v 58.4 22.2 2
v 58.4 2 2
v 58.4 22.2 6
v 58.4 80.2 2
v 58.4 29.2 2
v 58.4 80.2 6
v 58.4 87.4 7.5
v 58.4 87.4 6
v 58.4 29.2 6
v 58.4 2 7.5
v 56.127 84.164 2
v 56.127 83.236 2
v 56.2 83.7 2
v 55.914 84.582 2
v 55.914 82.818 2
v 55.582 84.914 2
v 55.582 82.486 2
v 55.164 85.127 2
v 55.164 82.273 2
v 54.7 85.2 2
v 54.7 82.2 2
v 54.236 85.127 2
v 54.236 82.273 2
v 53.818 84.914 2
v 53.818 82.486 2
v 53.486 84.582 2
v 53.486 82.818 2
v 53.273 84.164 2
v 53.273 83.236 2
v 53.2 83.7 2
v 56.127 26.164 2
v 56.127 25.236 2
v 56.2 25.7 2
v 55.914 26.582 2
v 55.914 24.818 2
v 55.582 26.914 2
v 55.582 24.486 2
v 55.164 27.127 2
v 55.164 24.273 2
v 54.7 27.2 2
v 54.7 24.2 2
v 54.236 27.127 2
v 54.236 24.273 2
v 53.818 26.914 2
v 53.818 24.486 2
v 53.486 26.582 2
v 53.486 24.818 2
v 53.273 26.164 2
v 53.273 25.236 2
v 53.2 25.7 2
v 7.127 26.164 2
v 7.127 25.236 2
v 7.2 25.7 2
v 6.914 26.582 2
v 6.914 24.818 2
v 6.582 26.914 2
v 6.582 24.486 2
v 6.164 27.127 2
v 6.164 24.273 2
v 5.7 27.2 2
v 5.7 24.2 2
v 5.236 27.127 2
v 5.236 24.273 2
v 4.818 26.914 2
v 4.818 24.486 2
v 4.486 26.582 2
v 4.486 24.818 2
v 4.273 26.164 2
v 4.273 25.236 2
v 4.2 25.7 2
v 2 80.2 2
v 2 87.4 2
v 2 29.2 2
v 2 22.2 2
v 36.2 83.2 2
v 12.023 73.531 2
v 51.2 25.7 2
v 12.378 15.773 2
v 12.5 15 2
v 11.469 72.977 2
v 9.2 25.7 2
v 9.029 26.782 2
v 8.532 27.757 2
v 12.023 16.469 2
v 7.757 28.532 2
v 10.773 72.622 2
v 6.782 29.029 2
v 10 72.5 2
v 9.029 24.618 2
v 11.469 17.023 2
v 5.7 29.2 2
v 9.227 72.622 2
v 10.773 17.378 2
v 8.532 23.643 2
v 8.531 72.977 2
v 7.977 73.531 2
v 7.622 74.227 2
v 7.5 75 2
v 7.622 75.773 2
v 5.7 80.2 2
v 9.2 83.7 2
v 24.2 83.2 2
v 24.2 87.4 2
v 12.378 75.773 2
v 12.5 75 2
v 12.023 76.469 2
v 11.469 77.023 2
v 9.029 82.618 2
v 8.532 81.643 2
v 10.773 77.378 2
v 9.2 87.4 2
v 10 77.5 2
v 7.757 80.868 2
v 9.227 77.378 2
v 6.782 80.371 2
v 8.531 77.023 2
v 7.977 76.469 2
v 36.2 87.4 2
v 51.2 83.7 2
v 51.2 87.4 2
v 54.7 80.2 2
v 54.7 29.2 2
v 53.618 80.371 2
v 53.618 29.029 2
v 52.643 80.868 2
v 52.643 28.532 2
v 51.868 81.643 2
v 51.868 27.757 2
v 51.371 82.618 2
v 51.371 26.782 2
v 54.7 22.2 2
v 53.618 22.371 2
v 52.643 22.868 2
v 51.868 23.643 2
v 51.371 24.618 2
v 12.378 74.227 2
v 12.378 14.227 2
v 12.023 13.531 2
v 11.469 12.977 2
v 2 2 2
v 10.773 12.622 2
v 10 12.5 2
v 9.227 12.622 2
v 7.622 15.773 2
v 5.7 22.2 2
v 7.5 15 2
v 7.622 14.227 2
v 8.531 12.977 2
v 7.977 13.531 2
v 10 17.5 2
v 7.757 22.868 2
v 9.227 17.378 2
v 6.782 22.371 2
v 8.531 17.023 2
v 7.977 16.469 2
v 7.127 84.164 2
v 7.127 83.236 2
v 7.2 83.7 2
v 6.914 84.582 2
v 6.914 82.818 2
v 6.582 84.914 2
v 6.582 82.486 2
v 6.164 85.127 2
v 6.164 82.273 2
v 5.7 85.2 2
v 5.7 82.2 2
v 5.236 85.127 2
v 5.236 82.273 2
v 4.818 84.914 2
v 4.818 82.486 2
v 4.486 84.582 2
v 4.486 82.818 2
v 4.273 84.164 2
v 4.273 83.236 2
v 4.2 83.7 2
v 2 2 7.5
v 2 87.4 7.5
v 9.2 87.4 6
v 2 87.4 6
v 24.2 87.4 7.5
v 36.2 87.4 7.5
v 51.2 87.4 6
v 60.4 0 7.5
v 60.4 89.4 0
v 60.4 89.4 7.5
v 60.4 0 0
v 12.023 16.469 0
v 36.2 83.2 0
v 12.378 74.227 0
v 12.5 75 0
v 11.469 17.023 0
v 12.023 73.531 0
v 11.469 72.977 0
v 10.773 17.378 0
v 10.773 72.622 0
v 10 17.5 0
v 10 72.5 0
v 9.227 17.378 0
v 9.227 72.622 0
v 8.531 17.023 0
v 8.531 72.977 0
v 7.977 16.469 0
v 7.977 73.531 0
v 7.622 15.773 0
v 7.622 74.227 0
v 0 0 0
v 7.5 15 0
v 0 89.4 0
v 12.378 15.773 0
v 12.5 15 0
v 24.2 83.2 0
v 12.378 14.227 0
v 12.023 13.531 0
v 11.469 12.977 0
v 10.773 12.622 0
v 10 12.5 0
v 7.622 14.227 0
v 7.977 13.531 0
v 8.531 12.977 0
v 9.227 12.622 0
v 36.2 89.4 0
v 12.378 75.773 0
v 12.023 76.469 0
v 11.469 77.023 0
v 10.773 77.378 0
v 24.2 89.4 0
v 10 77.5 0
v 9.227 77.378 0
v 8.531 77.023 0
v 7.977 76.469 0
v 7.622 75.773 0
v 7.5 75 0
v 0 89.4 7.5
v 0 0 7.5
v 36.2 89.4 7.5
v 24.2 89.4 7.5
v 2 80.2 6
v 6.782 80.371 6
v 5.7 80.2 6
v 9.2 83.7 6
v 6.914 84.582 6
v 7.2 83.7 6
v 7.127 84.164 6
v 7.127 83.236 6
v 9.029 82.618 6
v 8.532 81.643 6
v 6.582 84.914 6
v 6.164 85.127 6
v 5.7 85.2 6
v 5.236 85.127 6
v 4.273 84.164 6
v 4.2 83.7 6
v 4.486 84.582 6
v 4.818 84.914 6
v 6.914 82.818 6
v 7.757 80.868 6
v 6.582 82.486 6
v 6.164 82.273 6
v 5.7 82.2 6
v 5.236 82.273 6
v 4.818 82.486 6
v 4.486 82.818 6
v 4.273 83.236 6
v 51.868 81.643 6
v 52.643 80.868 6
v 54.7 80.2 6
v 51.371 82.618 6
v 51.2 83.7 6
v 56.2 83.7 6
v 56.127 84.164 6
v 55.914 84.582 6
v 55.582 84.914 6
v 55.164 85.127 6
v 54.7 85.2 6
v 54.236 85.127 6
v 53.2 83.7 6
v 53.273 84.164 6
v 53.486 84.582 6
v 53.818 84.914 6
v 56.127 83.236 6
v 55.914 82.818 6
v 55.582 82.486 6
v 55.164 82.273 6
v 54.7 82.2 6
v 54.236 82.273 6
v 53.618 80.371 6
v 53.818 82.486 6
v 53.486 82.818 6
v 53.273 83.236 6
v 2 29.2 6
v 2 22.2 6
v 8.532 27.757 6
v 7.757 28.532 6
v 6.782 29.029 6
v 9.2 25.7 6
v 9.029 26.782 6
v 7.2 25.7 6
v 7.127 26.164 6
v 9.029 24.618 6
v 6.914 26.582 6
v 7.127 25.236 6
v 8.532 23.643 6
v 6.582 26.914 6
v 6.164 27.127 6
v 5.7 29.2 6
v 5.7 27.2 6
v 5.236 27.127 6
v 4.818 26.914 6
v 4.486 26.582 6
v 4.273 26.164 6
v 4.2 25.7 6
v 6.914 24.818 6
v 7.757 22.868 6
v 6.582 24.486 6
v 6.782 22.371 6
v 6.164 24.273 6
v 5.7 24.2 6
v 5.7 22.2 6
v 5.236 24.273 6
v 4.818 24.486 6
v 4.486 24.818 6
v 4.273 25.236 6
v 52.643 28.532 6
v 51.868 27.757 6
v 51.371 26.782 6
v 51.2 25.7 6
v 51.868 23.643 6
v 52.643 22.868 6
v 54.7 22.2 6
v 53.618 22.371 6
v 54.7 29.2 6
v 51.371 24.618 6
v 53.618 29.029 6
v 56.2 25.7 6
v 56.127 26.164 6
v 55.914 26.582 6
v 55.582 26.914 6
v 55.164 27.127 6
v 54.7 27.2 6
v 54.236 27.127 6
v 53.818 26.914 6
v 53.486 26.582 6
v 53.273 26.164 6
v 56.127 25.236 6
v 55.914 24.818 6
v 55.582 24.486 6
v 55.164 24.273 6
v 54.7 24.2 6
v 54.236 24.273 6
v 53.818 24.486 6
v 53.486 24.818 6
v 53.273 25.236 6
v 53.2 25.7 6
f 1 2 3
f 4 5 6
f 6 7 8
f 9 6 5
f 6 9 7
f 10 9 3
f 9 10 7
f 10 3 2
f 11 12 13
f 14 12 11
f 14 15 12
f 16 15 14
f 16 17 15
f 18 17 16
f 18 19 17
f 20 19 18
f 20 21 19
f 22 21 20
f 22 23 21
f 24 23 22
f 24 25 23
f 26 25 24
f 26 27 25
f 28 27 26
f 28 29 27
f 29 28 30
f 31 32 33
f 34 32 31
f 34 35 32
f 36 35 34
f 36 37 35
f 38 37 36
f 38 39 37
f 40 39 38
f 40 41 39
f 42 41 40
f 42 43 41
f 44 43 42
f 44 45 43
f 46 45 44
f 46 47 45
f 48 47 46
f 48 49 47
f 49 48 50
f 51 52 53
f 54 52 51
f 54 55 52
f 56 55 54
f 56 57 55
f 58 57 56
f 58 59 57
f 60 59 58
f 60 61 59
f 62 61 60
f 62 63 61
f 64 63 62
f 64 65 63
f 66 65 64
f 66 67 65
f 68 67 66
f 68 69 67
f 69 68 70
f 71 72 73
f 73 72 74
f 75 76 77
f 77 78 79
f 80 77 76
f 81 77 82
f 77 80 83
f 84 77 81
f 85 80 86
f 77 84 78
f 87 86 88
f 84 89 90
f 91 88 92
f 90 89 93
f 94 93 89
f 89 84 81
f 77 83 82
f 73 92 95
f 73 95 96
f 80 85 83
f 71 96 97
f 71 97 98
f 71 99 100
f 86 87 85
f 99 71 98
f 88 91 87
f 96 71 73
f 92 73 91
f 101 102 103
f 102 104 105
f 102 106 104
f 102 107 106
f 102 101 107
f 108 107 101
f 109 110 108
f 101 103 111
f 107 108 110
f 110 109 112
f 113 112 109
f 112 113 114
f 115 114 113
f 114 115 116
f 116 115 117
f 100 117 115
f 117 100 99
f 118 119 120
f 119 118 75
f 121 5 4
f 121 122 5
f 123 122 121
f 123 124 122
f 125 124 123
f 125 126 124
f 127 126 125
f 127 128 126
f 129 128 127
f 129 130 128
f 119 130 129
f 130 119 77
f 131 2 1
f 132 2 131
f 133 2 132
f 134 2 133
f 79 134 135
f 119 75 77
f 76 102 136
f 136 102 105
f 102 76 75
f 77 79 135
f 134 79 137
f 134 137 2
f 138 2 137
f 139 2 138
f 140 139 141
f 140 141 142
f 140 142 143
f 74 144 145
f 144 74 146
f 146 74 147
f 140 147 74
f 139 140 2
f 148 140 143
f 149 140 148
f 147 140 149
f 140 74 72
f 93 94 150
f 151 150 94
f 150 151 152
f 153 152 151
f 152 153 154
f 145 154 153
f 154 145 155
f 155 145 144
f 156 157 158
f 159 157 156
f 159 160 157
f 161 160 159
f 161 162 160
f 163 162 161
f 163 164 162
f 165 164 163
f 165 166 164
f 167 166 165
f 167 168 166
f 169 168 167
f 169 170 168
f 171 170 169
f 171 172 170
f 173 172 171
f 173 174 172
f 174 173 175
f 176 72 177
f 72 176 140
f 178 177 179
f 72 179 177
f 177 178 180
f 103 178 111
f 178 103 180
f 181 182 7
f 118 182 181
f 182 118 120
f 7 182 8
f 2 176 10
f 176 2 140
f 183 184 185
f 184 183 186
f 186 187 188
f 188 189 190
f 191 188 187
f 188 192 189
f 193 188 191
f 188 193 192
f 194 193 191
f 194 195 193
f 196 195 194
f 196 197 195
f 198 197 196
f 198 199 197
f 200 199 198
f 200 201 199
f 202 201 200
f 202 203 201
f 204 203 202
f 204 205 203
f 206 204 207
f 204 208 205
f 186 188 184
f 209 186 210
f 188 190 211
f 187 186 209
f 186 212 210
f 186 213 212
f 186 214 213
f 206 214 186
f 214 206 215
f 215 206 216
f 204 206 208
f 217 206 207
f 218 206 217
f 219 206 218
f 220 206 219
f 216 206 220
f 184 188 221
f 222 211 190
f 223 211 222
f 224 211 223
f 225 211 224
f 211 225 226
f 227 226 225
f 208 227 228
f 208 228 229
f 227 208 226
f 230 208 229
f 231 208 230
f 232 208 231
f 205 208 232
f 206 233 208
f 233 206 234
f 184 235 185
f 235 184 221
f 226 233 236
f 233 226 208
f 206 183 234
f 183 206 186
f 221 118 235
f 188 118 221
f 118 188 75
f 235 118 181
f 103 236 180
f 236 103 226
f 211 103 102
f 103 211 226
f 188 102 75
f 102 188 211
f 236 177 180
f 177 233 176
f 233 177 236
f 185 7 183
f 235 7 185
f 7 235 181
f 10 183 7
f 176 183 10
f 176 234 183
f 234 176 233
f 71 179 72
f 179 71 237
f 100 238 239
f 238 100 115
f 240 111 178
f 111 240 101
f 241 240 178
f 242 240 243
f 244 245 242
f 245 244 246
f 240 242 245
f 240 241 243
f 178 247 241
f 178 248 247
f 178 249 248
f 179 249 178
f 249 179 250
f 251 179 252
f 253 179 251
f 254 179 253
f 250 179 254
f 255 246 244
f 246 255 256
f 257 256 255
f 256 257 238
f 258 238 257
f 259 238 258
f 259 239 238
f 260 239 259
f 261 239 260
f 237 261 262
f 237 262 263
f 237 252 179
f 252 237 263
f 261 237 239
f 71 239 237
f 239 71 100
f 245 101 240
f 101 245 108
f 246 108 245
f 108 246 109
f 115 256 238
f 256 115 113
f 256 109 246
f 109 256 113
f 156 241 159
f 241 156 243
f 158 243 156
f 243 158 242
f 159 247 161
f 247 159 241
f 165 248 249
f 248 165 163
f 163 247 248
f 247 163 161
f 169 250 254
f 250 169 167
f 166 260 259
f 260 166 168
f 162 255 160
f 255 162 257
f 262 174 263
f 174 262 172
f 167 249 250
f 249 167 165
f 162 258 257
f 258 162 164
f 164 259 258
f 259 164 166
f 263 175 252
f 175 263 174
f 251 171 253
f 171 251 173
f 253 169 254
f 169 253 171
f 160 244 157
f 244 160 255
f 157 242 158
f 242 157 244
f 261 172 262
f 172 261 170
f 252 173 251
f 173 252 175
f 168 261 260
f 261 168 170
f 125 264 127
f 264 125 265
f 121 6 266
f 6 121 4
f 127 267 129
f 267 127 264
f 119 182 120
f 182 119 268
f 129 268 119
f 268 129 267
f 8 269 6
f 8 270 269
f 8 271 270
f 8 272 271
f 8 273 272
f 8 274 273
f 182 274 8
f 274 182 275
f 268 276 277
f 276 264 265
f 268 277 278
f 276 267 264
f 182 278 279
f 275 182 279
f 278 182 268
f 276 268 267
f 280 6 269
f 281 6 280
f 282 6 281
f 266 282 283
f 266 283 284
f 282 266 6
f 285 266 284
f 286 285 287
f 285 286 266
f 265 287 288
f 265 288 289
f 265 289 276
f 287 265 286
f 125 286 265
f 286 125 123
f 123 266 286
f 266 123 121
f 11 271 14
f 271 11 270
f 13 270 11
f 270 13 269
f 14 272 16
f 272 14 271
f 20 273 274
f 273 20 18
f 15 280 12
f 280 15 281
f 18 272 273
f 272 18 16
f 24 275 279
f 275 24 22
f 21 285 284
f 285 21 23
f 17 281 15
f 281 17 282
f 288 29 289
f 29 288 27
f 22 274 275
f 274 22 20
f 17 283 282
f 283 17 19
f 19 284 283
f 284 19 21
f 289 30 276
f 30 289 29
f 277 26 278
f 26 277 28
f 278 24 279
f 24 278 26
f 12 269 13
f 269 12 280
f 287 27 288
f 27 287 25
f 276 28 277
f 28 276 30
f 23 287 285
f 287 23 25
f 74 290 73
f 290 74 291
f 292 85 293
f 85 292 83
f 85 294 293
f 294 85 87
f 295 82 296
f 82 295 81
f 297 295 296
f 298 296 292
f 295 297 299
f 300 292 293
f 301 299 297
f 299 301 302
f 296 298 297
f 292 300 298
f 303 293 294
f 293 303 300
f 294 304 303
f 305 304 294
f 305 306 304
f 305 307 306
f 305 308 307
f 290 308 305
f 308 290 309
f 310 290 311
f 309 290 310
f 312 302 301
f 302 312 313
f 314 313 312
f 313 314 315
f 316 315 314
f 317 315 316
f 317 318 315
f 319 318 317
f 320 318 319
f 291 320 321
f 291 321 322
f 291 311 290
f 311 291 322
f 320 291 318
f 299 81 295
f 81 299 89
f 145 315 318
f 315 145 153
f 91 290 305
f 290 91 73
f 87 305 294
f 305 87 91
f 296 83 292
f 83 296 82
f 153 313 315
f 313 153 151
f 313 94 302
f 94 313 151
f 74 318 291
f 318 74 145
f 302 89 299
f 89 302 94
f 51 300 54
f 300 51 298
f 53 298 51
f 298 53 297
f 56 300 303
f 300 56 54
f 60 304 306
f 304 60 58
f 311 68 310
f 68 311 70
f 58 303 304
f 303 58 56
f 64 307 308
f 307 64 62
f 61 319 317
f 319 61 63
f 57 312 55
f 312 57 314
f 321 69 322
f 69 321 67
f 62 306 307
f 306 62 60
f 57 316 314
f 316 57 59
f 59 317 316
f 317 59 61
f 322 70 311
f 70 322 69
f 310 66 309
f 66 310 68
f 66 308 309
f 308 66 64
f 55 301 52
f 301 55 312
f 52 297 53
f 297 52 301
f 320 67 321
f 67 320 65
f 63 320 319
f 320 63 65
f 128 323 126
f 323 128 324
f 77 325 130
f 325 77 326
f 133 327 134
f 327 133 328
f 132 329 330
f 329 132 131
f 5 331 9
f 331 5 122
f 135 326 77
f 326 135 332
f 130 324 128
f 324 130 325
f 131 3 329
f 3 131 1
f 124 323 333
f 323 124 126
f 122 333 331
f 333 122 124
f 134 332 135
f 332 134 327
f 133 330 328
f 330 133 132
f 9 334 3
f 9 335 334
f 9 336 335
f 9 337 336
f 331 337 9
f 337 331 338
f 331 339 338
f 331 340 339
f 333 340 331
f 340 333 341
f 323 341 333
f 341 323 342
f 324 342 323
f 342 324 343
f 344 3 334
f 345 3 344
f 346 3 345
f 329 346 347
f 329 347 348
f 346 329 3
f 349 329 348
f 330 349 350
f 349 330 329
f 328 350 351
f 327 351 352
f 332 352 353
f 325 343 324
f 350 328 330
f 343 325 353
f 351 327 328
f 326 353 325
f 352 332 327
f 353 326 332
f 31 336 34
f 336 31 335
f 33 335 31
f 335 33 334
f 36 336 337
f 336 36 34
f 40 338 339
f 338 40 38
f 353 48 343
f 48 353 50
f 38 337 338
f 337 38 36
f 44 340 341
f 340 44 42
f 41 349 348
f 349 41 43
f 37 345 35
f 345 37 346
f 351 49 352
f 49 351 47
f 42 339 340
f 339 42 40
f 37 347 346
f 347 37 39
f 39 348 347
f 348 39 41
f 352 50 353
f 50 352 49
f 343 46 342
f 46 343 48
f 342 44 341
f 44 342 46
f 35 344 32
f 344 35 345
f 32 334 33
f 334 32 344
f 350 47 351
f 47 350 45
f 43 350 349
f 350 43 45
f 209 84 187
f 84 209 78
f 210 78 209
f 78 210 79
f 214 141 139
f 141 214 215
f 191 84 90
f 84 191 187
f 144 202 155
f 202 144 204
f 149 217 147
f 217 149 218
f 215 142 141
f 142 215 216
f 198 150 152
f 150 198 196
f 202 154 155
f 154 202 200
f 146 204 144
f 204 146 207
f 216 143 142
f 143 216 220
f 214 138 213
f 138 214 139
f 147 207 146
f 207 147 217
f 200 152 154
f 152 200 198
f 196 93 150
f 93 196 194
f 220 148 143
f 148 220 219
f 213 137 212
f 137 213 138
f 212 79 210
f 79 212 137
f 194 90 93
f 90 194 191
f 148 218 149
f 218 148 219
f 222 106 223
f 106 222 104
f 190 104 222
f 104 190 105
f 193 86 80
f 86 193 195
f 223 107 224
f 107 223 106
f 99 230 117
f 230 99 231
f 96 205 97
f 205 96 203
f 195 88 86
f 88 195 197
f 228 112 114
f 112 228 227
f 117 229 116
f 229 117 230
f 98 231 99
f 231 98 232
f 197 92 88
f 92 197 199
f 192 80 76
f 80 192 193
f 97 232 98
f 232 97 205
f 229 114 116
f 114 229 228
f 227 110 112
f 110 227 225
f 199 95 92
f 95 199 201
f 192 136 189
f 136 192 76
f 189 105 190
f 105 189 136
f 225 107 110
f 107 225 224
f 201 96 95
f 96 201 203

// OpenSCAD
/*
 * Raspberry Pi3 case for Prusa MK3

 * Originally not intended for use with the Prusa MK3; I just wanted a openscad code base to work with to make future cases.
 * I have borrowed the standoff design and the supports at the ports from https://www.thingiverse.com/thing:1325370
 
*/

/* [Main] */

// Which part to render
part = "base"; // [ lid: Lid, base: Base, both: Box ]

/* [Hidden] */

board = [85, 56 , 1.3 ];  //dimension of rasp pi
t     = 1.40;             //Thickness of rasp pi board
p     = 3;              //Thickness of plastic case

_t_wall    = 2;              // Thickness of outer walls
_t_b  = 2;              // Thickness of top and bottom
_rpi_w = 56;
_rpi_l = 85;
_rpi_padding = 0.2;
_rpi_t = 1.4;
_rpi_hole_l_offset = 58;

_inner_h = 12.8; // Just guessing here

_h_rpi_offset = 4 + _t_b;

// This cannot be fiddle with too much as it will break the stereo jack hole
_split_offset = 7.5;

_hole_offset = 3.5;

_outer_l = _t_wall*2 + _rpi_padding*2 + _rpi_l;
_outer_w = _t_wall*2 + _rpi_padding*2 + _rpi_w;
_outer_h = _t_b*2+_inner_h+_h_rpi_offset;

$fn=20;


show();

module show() {
    base();
}

module rpi() {
    difference() {
        cube([_rpi_w,_rpi_l,_rpi_t]);

        // rpi holes
        translate([_hole_offset,_rpi_l-_hole_offset,-1]) cylinder(r=2.75/2,h=_rpi_t+2);
        translate([_rpi_w-_hole_offset,_rpi_l-_hole_offset,-1]) cylinder(r=2.75/2,h=_rpi_t+2);
        translate([_hole_offset,_rpi_l-3.5-_rpi_hole_l_offset,-1]) cylinder(r=2.75/2,h=_rpi_t+2);
        translate([_rpi_w-_hole_offset,_rpi_l-_hole_offset-_rpi_hole_l_offset,-1]) cylinder(r=2.75/2,h=_rpi_t+2);
    }
}

module box() {
    
    _sd_width = 12;
    _sd_depth = 3;
    _sd_inset = 4;

    difference() {

        cube([_t_wall*2+_rpi_padding*2+_rpi_w,_t_wall*2+_rpi_padding*2+_rpi_l,_outer_h]);

        difference() {
            translate([_t_wall,_t_wall,_t_b])
                cube([_rpi_padding*2+_rpi_w,_rpi_padding*2+_rpi_l,_outer_h-2*_t_b]);

            translate([0,_t_wall,_outer_h-_t_b])
            rotate([0,90,0])
            linear_extrude(height=_outer_w)
                polygon([[0,0],[0,(_outer_h-_split_offset-_t_b)*0.8],[_outer_h-_split_offset-_t_b,0]]);

        }


        _hole_padding=0.2;

        // SD card slot
        // We assume the slot is "almost" centered
        translate([_t_wall + _rpi_padding + _rpi_w/2 - _sd_width/2, _outer_l-_t_wall-_rpi_padding-_sd_inset,-1])
            cube([_sd_width,_sd_depth+_rpi_padding+_t_wall+_sd_inset+1,_h_rpi_offset+1]);

    }
}

module rounded_slot(l,t,h) {
    translate([t/2,t/2,0])
    hull() {
        cylinder(r=t/2,h=h);
        translate([l-t,0,0]) cylinder(r=t/2,h=h);
    }
}


module base_cut() {
    difference() {
        box();
        translate([-1,-1,_split_offset])
            cube([_rpi_w*2,_rpi_l*2,(_inner_h+_h_rpi_offset)*2]);
    }
}

module base() {

    difference() {

        union() {

            base_cut();

            _standoff_r=3.5;
            _standoff_hole_r=1.5;


            // Screw standoffs
            translate([_t_wall+_rpi_padding+_hole_offset,_t_wall+_rpi_padding+_rpi_l-_hole_offset,0])
            {
                difference() {
                    hull() {
                        cylinder(r=_standoff_r,h=_h_rpi_offset);
                        translate([-_standoff_r,_hole_offset+_rpi_padding-1,0]) cube([_standoff_r*2,1,_h_rpi_offset]);
                        translate([-_hole_offset-_rpi_padding,-_standoff_r,0]) cube([1,_standoff_r*2,_h_rpi_offset]);
                        translate([-_rpi_padding-_hole_offset,0,0])  cube([_rpi_padding+_hole_offset,_rpi_padding+_hole_offset,_h_rpi_offset]);
                    }
                    translate([0,0,_t_b]) cylinder(r=_standoff_hole_r,h=_h_rpi_offset);
                }
            }


            translate([_t_wall+_rpi_padding+_rpi_w-_hole_offset,_t_wall+_rpi_padding+_rpi_l-_hole_offset,0])
            {
                difference() {
                    hull() {
                        cylinder(r=_standoff_r,h=_h_rpi_offset);
                        translate([-_standoff_r,_hole_offset+_rpi_padding-1,0]) cube([_standoff_r*2,1,_h_rpi_offset]);
                        translate([_hole_offset+_rpi_padding,-_standoff_r,0]) cube([1,_standoff_r*2,_h_rpi_offset]);
                        translate([0,0,0])  cube([_rpi_padding+_hole_offset,_rpi_padding+_hole_offset,_h_rpi_offset]);
                    }
                    translate([0,0,_t_b]) cylinder(r=_standoff_hole_r,h=_h_rpi_offset);
                }
            }

            translate([_t_wall+_rpi_padding+_hole_offset,_t_wall+_rpi_padding+_rpi_l-_hole_offset-_rpi_hole_l_offset,0])
            {
                difference() {
                    hull() {
                        cylinder(r=_standoff_r,h=_h_rpi_offset);
                        translate([-_hole_offset-_rpi_padding,-_standoff_r,0]) cube([1,_standoff_r*2,_h_rpi_offset]);
                    }
                    translate([0,0,_t_b]) cylinder(r=_standoff_hole_r,h=_h_rpi_offset);
                }
            }

            translate([_t_wall+_rpi_padding+_rpi_w-_hole_offset,_t_wall+_rpi_padding+_rpi_l-_hole_offset-_rpi_hole_l_offset,0])
            {
                difference() {
                    hull() {
                        cylinder(r=_standoff_r,h=_h_rpi_offset);
                        translate([_hole_offset+_rpi_padding,-_standoff_r,0]) cube([1,_standoff_r*2,_h_rpi_offset]);
                    }
                    translate([0,0,_t_b]) cylinder(r=_standoff_hole_r,h=_h_rpi_offset);
                }
            }
        }

        // mounting holes
        translate([10, 15, -1]) cylinder(r=2.5,h=10);
        translate([10, 75, -1]) cylinder(r=2.5,h=10);

        // Cut out for the SD card
        _sd_width = 12;
        _sd_depth = 3;
        translate([_t_wall + _rpi_padding + _rpi_w/2 - _sd_width/2, _outer_l-_t_wall-_rpi_padding,4])
            cube([_sd_width,_sd_depth+_rpi_padding+_t_wall+1,_h_rpi_offset+1]);

    }
}
